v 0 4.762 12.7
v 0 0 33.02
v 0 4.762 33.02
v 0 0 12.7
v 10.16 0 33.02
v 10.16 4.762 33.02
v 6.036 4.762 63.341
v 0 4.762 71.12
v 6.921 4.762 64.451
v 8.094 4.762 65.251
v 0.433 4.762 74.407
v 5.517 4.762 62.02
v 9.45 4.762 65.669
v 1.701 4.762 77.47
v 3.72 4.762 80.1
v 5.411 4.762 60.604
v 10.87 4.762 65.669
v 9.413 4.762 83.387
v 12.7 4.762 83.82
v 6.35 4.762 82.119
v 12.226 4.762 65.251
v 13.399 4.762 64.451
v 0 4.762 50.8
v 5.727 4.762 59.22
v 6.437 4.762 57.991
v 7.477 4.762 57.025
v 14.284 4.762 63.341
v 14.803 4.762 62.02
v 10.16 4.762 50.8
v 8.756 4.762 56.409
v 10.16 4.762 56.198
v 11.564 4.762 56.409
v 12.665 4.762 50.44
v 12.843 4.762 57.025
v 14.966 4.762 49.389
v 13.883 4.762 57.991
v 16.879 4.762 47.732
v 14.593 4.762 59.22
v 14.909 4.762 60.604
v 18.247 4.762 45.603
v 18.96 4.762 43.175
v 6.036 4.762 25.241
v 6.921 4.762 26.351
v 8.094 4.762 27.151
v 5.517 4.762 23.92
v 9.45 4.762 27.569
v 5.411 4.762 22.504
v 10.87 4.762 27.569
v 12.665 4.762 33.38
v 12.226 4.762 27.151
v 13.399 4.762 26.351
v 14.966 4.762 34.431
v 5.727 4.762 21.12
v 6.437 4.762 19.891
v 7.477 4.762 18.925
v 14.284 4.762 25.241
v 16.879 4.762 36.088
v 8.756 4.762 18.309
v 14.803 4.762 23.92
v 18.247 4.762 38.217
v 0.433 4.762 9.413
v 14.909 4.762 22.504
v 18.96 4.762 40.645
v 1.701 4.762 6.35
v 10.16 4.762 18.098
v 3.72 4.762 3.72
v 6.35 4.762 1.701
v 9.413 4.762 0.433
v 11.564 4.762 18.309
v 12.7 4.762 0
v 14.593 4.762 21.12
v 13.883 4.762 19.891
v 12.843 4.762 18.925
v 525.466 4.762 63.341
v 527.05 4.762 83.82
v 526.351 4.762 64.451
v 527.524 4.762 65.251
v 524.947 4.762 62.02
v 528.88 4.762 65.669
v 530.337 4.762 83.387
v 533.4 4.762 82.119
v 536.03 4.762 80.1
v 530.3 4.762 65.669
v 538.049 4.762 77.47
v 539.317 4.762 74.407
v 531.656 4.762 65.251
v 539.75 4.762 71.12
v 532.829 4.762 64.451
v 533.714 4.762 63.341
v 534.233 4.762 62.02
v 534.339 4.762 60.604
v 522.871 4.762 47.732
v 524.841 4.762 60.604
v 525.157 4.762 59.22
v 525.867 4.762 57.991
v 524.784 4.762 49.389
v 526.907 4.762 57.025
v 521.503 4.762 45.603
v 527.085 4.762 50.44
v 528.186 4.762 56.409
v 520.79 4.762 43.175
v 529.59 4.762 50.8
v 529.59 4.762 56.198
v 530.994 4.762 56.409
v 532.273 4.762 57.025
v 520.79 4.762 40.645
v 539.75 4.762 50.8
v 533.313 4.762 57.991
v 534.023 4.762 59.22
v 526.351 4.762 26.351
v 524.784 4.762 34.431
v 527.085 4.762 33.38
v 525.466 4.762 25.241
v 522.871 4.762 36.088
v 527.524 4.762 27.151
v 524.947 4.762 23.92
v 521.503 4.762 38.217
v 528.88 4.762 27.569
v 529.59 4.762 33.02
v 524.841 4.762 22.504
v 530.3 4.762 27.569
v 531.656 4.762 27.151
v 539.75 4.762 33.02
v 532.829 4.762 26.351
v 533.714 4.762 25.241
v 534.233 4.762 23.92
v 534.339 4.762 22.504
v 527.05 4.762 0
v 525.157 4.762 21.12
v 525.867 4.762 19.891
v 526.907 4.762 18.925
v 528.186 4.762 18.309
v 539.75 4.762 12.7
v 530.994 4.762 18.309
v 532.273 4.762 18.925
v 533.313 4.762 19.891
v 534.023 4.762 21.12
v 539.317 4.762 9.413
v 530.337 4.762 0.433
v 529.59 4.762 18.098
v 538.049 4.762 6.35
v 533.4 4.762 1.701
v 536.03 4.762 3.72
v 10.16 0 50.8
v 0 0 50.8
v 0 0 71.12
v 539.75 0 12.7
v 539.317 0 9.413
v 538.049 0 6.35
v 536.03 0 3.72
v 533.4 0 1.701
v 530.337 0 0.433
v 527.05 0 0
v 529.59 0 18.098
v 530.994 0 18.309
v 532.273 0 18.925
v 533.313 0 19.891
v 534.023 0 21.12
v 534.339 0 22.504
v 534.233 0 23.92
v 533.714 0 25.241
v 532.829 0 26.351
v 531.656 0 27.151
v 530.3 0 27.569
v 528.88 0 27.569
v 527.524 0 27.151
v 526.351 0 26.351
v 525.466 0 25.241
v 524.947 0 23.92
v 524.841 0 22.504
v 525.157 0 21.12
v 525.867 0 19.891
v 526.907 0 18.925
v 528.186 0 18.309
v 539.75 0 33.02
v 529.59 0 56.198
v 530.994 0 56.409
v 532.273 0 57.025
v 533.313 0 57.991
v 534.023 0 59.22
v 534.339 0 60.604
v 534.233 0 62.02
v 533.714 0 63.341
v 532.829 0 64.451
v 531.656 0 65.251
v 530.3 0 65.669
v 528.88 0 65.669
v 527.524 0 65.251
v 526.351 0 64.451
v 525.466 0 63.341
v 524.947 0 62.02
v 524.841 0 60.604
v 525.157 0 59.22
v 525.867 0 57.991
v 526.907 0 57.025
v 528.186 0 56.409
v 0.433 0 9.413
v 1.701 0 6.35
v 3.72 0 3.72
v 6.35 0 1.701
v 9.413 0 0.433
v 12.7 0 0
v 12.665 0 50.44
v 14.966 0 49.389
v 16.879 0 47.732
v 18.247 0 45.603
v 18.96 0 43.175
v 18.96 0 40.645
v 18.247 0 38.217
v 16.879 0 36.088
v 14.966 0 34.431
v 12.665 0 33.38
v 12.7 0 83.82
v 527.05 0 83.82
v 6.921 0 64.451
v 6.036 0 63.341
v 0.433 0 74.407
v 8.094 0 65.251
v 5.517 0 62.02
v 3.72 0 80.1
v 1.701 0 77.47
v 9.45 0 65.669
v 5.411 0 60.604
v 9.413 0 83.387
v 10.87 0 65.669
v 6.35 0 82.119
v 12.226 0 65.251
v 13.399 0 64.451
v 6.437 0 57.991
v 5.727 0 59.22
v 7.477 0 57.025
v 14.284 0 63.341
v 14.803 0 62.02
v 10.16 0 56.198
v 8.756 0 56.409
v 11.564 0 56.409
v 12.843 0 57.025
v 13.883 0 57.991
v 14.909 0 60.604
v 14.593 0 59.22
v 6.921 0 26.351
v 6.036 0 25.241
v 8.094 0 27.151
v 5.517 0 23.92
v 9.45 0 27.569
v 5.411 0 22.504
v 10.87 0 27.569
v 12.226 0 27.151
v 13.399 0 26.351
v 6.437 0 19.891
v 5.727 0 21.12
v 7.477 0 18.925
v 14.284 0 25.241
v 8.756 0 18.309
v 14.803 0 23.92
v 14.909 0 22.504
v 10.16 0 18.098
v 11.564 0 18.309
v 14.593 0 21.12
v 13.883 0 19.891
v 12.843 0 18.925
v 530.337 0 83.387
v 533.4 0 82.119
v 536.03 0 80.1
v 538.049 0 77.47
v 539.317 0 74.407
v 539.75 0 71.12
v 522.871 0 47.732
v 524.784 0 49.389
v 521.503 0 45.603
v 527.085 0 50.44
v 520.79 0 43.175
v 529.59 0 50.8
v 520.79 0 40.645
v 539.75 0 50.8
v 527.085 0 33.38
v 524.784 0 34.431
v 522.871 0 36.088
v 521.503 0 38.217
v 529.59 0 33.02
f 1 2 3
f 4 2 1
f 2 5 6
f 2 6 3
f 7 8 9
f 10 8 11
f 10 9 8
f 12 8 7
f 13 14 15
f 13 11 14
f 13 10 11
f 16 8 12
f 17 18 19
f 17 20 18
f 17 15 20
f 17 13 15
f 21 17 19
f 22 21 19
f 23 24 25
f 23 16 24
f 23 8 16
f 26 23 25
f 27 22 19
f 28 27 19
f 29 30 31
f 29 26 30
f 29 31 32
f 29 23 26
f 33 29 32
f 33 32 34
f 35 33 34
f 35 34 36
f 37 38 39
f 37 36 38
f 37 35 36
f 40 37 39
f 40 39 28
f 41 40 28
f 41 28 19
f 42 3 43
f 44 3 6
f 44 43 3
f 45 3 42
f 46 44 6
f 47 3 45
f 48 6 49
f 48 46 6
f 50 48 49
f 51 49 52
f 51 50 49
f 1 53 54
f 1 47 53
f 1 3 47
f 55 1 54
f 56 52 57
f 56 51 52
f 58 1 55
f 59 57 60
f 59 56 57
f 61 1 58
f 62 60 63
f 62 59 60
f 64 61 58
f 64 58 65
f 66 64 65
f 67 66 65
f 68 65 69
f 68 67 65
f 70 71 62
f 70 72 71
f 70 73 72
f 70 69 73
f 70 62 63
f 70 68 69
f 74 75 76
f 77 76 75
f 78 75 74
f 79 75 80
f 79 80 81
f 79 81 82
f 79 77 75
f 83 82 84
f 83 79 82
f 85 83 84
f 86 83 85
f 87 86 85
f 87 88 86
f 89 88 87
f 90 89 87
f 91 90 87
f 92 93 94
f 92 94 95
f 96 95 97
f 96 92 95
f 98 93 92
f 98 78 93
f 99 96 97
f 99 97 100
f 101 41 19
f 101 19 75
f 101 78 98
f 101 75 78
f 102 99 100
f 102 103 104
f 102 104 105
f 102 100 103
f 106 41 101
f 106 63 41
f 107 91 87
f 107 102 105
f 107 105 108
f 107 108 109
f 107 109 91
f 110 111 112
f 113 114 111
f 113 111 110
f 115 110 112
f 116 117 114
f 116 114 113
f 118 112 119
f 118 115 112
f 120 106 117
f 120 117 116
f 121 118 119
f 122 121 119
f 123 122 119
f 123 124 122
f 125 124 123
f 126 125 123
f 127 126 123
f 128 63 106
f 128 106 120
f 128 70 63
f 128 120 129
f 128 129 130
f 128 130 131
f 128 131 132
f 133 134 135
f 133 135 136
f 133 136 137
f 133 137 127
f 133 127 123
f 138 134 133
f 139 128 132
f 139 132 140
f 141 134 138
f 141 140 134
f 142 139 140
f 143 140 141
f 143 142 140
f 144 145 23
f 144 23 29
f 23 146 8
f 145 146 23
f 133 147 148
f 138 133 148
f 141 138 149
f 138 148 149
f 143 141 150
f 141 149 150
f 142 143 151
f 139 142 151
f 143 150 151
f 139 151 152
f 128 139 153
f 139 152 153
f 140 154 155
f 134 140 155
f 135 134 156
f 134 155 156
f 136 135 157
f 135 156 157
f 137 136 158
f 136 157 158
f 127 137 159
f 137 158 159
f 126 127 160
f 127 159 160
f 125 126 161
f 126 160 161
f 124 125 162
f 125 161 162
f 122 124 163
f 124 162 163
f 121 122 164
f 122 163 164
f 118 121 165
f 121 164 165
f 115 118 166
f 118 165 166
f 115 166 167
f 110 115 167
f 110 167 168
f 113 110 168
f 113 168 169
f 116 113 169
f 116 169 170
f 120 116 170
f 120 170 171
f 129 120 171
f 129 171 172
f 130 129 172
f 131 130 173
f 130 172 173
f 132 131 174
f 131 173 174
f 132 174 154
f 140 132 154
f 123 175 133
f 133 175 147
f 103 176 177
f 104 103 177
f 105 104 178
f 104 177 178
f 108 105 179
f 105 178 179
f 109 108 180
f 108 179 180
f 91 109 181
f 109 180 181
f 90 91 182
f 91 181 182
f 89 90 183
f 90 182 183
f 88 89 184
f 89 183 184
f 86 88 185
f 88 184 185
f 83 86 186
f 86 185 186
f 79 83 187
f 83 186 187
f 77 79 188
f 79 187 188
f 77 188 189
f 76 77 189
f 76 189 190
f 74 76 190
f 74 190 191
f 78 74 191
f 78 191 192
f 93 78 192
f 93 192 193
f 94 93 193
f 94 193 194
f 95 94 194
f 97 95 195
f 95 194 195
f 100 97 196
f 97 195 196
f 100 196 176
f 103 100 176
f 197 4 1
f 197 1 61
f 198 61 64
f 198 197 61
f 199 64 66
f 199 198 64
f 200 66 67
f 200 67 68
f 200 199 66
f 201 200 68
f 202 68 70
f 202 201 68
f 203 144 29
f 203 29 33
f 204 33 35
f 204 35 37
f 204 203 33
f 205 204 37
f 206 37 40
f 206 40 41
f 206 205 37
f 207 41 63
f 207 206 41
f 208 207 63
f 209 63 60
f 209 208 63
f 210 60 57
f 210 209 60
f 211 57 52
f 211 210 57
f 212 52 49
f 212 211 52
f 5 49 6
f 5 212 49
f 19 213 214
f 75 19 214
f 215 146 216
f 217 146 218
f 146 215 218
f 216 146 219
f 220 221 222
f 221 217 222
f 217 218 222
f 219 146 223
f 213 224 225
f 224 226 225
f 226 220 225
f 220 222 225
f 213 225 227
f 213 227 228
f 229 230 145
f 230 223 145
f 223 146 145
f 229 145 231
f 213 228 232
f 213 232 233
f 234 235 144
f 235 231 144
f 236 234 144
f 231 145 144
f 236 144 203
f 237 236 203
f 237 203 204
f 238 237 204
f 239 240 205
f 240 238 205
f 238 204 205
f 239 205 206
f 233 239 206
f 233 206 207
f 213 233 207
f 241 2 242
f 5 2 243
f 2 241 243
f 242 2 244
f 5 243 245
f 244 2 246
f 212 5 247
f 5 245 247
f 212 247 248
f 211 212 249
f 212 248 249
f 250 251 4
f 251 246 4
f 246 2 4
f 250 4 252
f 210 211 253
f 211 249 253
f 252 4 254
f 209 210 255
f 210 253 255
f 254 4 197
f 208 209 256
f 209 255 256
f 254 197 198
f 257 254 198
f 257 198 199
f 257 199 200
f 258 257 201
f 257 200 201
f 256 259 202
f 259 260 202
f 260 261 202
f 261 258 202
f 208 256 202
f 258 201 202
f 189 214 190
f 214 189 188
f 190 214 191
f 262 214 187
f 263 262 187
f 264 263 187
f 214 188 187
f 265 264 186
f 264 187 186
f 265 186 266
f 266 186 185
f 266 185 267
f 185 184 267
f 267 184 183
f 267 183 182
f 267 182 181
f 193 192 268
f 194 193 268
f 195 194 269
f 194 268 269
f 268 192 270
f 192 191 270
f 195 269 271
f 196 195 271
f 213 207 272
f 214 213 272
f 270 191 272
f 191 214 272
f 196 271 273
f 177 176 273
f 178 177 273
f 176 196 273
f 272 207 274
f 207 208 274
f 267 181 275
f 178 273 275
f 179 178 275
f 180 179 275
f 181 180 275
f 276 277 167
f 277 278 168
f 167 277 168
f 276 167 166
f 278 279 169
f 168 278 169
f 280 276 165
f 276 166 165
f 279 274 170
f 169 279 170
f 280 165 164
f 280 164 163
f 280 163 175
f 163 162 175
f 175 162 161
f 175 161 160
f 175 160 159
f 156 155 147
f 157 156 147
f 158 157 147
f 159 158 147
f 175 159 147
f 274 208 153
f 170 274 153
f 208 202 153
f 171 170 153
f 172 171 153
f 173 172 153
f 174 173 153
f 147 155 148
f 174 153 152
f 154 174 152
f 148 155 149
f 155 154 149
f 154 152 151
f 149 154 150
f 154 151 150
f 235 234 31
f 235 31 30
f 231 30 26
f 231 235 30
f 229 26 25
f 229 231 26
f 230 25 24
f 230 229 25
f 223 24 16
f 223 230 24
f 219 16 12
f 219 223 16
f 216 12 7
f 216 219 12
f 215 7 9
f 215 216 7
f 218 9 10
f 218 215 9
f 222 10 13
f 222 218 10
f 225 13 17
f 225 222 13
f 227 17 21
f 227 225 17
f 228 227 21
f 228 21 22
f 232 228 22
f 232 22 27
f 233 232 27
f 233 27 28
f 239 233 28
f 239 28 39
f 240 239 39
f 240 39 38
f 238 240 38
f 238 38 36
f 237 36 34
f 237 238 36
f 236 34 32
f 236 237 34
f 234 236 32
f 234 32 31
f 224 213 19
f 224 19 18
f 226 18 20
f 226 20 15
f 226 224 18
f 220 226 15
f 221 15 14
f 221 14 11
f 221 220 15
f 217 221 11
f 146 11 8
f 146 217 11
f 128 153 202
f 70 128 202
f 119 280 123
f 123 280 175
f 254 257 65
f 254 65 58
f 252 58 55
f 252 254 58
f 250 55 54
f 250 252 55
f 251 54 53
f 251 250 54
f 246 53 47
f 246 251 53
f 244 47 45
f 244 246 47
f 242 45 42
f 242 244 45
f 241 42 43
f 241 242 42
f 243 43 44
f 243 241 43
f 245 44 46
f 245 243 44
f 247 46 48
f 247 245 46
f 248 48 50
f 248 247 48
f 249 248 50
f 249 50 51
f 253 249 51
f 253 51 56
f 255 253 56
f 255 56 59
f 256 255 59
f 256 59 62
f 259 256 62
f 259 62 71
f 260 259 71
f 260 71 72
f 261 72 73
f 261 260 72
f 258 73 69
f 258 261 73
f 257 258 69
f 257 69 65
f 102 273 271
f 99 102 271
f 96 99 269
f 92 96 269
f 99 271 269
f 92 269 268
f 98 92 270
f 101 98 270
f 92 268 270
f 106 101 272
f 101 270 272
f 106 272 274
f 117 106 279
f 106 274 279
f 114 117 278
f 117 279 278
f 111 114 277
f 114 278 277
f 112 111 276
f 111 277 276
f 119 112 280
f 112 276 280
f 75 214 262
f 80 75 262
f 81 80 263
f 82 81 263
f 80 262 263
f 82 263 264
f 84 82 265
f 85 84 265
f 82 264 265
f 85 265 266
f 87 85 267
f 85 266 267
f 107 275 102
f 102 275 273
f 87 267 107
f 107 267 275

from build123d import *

# Parameters (mm, degrees)
SKETCH1_R           = 4.7625
BOSS_EXTRUDE1_DEPTH = 4.7625


with BuildPart() as part:
    # Sketch1 → Boss-Extrude1 (new body)
    with BuildSketch(Plane(origin=(0, 0, 0), x_dir=(1, 0, 0), z_dir=(0, 1, 0))):
        with BuildLine():
            Line((12.7, 0), (269.875, 0))
            Line((269.875, 0), (269.875, -83.82))
            Line((269.875, -83.82), (12.7, -83.82))
            ThreePointArc((12.7, -83.82), (3.719743879, -80.100256121), (0, -71.12))
            Line((0, -71.12), (0, -50.8))
            Line((0, -50.8), (10.16, -50.8))
            ThreePointArc((10.16, -50.8), (19.05, -41.91), (10.16, -33.02))
            Line((10.16, -33.02), (0, -33.02))
            Line((0, -33.02), (0, -12.7))
            ThreePointArc((0, -12.7), (3.719743879, -3.719743879), (12.7, 0))
        make_face()
        with Locations(Location((10.16, -60.96, 0), (0, 0, 90))):
            Circle(SKETCH1_R, mode=Mode.SUBTRACT)
        with Locations(Location((10.16, -22.86, 0), (0, 0, 90))):
            Circle(SKETCH1_R, mode=Mode.SUBTRACT)
    boss_extrude1 = extrude(amount=BOSS_EXTRUDE1_DEPTH)

    # Mirror1: Boss-Extrude1 across plane
    add(boss_extrude1.mirror(Plane(origin=(269.875, 4.7625, 0), x_dir=(0, 0, 1), z_dir=(-1, 0, 0))))


solid = part.part
